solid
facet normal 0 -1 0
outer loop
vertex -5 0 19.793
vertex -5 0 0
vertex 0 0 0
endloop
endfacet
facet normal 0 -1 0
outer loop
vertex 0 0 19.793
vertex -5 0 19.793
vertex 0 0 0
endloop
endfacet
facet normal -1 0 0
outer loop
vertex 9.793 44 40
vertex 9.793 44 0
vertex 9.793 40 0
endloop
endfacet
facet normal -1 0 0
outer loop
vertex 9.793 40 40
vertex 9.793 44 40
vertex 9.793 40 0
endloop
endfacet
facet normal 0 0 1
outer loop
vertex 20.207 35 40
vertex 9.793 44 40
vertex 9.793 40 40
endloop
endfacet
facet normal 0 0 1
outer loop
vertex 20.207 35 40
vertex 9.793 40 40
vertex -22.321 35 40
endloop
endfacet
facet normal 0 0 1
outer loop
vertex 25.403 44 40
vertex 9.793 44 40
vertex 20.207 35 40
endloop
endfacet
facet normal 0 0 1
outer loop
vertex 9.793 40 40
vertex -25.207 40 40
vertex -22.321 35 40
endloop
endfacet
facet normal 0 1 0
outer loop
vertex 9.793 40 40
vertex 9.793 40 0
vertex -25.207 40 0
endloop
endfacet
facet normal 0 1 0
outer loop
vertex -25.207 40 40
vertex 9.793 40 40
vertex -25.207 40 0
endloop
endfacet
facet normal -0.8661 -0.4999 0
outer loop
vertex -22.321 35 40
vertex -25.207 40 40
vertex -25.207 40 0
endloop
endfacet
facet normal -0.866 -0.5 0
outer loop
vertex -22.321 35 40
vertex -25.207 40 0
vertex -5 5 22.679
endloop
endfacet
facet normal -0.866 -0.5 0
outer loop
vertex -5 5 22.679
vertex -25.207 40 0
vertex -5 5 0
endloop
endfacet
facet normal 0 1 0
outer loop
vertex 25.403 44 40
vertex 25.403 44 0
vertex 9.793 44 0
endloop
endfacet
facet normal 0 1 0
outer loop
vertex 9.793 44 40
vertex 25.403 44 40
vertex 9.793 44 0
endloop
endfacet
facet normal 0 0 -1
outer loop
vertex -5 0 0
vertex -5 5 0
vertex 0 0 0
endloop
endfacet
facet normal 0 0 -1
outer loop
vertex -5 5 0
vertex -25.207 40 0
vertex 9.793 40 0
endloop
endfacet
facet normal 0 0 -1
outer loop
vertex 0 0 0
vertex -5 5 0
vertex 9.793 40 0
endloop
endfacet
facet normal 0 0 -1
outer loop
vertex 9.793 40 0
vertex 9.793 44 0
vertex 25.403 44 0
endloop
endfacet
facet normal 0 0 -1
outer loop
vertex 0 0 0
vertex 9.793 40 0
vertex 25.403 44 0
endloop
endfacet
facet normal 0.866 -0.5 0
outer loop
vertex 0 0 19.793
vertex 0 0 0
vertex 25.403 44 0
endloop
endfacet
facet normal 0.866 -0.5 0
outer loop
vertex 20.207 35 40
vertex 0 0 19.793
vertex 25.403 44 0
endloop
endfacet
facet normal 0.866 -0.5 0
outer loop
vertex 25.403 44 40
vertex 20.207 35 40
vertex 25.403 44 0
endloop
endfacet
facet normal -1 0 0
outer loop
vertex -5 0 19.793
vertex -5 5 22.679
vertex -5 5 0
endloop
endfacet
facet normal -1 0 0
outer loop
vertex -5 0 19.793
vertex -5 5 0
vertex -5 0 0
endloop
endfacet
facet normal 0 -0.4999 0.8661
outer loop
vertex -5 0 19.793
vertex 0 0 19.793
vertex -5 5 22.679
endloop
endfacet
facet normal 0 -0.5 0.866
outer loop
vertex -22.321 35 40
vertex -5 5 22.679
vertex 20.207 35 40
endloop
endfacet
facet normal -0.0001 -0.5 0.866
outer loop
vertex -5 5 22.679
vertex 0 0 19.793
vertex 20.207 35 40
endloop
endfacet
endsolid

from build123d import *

# Parameters (mm, degrees)
F1_DEPTH      = 40
F3_DEPTH      = 25.2082594216
F3_DEPTH_BACK = 25


with BuildPart() as f1:
    # F0 (on Top) → F1 (new body)
    with BuildSketch(Plane.XY):
        Polygon((-5, 0), (0, 0), (25.4034118443, 44), (9.7927405784, 44), (9.7927405784, 40), (0, 40), (-25.2072594216, 40), (-5, 5), align=None)
    extrude(amount=F1_DEPTH)

    # F2 (on Right) → F3 (cut, two sides)
    with BuildSketch(Plane.YZ) as f3_sk:
        Polygon((35, 40), (0, 40), (0, 19.7927405784), align=None)
    extrude(amount=-F3_DEPTH, mode=Mode.SUBTRACT)
    extrude(f3_sk.sketch, amount=F3_DEPTH_BACK, mode=Mode.SUBTRACT)


solid = f1.part
